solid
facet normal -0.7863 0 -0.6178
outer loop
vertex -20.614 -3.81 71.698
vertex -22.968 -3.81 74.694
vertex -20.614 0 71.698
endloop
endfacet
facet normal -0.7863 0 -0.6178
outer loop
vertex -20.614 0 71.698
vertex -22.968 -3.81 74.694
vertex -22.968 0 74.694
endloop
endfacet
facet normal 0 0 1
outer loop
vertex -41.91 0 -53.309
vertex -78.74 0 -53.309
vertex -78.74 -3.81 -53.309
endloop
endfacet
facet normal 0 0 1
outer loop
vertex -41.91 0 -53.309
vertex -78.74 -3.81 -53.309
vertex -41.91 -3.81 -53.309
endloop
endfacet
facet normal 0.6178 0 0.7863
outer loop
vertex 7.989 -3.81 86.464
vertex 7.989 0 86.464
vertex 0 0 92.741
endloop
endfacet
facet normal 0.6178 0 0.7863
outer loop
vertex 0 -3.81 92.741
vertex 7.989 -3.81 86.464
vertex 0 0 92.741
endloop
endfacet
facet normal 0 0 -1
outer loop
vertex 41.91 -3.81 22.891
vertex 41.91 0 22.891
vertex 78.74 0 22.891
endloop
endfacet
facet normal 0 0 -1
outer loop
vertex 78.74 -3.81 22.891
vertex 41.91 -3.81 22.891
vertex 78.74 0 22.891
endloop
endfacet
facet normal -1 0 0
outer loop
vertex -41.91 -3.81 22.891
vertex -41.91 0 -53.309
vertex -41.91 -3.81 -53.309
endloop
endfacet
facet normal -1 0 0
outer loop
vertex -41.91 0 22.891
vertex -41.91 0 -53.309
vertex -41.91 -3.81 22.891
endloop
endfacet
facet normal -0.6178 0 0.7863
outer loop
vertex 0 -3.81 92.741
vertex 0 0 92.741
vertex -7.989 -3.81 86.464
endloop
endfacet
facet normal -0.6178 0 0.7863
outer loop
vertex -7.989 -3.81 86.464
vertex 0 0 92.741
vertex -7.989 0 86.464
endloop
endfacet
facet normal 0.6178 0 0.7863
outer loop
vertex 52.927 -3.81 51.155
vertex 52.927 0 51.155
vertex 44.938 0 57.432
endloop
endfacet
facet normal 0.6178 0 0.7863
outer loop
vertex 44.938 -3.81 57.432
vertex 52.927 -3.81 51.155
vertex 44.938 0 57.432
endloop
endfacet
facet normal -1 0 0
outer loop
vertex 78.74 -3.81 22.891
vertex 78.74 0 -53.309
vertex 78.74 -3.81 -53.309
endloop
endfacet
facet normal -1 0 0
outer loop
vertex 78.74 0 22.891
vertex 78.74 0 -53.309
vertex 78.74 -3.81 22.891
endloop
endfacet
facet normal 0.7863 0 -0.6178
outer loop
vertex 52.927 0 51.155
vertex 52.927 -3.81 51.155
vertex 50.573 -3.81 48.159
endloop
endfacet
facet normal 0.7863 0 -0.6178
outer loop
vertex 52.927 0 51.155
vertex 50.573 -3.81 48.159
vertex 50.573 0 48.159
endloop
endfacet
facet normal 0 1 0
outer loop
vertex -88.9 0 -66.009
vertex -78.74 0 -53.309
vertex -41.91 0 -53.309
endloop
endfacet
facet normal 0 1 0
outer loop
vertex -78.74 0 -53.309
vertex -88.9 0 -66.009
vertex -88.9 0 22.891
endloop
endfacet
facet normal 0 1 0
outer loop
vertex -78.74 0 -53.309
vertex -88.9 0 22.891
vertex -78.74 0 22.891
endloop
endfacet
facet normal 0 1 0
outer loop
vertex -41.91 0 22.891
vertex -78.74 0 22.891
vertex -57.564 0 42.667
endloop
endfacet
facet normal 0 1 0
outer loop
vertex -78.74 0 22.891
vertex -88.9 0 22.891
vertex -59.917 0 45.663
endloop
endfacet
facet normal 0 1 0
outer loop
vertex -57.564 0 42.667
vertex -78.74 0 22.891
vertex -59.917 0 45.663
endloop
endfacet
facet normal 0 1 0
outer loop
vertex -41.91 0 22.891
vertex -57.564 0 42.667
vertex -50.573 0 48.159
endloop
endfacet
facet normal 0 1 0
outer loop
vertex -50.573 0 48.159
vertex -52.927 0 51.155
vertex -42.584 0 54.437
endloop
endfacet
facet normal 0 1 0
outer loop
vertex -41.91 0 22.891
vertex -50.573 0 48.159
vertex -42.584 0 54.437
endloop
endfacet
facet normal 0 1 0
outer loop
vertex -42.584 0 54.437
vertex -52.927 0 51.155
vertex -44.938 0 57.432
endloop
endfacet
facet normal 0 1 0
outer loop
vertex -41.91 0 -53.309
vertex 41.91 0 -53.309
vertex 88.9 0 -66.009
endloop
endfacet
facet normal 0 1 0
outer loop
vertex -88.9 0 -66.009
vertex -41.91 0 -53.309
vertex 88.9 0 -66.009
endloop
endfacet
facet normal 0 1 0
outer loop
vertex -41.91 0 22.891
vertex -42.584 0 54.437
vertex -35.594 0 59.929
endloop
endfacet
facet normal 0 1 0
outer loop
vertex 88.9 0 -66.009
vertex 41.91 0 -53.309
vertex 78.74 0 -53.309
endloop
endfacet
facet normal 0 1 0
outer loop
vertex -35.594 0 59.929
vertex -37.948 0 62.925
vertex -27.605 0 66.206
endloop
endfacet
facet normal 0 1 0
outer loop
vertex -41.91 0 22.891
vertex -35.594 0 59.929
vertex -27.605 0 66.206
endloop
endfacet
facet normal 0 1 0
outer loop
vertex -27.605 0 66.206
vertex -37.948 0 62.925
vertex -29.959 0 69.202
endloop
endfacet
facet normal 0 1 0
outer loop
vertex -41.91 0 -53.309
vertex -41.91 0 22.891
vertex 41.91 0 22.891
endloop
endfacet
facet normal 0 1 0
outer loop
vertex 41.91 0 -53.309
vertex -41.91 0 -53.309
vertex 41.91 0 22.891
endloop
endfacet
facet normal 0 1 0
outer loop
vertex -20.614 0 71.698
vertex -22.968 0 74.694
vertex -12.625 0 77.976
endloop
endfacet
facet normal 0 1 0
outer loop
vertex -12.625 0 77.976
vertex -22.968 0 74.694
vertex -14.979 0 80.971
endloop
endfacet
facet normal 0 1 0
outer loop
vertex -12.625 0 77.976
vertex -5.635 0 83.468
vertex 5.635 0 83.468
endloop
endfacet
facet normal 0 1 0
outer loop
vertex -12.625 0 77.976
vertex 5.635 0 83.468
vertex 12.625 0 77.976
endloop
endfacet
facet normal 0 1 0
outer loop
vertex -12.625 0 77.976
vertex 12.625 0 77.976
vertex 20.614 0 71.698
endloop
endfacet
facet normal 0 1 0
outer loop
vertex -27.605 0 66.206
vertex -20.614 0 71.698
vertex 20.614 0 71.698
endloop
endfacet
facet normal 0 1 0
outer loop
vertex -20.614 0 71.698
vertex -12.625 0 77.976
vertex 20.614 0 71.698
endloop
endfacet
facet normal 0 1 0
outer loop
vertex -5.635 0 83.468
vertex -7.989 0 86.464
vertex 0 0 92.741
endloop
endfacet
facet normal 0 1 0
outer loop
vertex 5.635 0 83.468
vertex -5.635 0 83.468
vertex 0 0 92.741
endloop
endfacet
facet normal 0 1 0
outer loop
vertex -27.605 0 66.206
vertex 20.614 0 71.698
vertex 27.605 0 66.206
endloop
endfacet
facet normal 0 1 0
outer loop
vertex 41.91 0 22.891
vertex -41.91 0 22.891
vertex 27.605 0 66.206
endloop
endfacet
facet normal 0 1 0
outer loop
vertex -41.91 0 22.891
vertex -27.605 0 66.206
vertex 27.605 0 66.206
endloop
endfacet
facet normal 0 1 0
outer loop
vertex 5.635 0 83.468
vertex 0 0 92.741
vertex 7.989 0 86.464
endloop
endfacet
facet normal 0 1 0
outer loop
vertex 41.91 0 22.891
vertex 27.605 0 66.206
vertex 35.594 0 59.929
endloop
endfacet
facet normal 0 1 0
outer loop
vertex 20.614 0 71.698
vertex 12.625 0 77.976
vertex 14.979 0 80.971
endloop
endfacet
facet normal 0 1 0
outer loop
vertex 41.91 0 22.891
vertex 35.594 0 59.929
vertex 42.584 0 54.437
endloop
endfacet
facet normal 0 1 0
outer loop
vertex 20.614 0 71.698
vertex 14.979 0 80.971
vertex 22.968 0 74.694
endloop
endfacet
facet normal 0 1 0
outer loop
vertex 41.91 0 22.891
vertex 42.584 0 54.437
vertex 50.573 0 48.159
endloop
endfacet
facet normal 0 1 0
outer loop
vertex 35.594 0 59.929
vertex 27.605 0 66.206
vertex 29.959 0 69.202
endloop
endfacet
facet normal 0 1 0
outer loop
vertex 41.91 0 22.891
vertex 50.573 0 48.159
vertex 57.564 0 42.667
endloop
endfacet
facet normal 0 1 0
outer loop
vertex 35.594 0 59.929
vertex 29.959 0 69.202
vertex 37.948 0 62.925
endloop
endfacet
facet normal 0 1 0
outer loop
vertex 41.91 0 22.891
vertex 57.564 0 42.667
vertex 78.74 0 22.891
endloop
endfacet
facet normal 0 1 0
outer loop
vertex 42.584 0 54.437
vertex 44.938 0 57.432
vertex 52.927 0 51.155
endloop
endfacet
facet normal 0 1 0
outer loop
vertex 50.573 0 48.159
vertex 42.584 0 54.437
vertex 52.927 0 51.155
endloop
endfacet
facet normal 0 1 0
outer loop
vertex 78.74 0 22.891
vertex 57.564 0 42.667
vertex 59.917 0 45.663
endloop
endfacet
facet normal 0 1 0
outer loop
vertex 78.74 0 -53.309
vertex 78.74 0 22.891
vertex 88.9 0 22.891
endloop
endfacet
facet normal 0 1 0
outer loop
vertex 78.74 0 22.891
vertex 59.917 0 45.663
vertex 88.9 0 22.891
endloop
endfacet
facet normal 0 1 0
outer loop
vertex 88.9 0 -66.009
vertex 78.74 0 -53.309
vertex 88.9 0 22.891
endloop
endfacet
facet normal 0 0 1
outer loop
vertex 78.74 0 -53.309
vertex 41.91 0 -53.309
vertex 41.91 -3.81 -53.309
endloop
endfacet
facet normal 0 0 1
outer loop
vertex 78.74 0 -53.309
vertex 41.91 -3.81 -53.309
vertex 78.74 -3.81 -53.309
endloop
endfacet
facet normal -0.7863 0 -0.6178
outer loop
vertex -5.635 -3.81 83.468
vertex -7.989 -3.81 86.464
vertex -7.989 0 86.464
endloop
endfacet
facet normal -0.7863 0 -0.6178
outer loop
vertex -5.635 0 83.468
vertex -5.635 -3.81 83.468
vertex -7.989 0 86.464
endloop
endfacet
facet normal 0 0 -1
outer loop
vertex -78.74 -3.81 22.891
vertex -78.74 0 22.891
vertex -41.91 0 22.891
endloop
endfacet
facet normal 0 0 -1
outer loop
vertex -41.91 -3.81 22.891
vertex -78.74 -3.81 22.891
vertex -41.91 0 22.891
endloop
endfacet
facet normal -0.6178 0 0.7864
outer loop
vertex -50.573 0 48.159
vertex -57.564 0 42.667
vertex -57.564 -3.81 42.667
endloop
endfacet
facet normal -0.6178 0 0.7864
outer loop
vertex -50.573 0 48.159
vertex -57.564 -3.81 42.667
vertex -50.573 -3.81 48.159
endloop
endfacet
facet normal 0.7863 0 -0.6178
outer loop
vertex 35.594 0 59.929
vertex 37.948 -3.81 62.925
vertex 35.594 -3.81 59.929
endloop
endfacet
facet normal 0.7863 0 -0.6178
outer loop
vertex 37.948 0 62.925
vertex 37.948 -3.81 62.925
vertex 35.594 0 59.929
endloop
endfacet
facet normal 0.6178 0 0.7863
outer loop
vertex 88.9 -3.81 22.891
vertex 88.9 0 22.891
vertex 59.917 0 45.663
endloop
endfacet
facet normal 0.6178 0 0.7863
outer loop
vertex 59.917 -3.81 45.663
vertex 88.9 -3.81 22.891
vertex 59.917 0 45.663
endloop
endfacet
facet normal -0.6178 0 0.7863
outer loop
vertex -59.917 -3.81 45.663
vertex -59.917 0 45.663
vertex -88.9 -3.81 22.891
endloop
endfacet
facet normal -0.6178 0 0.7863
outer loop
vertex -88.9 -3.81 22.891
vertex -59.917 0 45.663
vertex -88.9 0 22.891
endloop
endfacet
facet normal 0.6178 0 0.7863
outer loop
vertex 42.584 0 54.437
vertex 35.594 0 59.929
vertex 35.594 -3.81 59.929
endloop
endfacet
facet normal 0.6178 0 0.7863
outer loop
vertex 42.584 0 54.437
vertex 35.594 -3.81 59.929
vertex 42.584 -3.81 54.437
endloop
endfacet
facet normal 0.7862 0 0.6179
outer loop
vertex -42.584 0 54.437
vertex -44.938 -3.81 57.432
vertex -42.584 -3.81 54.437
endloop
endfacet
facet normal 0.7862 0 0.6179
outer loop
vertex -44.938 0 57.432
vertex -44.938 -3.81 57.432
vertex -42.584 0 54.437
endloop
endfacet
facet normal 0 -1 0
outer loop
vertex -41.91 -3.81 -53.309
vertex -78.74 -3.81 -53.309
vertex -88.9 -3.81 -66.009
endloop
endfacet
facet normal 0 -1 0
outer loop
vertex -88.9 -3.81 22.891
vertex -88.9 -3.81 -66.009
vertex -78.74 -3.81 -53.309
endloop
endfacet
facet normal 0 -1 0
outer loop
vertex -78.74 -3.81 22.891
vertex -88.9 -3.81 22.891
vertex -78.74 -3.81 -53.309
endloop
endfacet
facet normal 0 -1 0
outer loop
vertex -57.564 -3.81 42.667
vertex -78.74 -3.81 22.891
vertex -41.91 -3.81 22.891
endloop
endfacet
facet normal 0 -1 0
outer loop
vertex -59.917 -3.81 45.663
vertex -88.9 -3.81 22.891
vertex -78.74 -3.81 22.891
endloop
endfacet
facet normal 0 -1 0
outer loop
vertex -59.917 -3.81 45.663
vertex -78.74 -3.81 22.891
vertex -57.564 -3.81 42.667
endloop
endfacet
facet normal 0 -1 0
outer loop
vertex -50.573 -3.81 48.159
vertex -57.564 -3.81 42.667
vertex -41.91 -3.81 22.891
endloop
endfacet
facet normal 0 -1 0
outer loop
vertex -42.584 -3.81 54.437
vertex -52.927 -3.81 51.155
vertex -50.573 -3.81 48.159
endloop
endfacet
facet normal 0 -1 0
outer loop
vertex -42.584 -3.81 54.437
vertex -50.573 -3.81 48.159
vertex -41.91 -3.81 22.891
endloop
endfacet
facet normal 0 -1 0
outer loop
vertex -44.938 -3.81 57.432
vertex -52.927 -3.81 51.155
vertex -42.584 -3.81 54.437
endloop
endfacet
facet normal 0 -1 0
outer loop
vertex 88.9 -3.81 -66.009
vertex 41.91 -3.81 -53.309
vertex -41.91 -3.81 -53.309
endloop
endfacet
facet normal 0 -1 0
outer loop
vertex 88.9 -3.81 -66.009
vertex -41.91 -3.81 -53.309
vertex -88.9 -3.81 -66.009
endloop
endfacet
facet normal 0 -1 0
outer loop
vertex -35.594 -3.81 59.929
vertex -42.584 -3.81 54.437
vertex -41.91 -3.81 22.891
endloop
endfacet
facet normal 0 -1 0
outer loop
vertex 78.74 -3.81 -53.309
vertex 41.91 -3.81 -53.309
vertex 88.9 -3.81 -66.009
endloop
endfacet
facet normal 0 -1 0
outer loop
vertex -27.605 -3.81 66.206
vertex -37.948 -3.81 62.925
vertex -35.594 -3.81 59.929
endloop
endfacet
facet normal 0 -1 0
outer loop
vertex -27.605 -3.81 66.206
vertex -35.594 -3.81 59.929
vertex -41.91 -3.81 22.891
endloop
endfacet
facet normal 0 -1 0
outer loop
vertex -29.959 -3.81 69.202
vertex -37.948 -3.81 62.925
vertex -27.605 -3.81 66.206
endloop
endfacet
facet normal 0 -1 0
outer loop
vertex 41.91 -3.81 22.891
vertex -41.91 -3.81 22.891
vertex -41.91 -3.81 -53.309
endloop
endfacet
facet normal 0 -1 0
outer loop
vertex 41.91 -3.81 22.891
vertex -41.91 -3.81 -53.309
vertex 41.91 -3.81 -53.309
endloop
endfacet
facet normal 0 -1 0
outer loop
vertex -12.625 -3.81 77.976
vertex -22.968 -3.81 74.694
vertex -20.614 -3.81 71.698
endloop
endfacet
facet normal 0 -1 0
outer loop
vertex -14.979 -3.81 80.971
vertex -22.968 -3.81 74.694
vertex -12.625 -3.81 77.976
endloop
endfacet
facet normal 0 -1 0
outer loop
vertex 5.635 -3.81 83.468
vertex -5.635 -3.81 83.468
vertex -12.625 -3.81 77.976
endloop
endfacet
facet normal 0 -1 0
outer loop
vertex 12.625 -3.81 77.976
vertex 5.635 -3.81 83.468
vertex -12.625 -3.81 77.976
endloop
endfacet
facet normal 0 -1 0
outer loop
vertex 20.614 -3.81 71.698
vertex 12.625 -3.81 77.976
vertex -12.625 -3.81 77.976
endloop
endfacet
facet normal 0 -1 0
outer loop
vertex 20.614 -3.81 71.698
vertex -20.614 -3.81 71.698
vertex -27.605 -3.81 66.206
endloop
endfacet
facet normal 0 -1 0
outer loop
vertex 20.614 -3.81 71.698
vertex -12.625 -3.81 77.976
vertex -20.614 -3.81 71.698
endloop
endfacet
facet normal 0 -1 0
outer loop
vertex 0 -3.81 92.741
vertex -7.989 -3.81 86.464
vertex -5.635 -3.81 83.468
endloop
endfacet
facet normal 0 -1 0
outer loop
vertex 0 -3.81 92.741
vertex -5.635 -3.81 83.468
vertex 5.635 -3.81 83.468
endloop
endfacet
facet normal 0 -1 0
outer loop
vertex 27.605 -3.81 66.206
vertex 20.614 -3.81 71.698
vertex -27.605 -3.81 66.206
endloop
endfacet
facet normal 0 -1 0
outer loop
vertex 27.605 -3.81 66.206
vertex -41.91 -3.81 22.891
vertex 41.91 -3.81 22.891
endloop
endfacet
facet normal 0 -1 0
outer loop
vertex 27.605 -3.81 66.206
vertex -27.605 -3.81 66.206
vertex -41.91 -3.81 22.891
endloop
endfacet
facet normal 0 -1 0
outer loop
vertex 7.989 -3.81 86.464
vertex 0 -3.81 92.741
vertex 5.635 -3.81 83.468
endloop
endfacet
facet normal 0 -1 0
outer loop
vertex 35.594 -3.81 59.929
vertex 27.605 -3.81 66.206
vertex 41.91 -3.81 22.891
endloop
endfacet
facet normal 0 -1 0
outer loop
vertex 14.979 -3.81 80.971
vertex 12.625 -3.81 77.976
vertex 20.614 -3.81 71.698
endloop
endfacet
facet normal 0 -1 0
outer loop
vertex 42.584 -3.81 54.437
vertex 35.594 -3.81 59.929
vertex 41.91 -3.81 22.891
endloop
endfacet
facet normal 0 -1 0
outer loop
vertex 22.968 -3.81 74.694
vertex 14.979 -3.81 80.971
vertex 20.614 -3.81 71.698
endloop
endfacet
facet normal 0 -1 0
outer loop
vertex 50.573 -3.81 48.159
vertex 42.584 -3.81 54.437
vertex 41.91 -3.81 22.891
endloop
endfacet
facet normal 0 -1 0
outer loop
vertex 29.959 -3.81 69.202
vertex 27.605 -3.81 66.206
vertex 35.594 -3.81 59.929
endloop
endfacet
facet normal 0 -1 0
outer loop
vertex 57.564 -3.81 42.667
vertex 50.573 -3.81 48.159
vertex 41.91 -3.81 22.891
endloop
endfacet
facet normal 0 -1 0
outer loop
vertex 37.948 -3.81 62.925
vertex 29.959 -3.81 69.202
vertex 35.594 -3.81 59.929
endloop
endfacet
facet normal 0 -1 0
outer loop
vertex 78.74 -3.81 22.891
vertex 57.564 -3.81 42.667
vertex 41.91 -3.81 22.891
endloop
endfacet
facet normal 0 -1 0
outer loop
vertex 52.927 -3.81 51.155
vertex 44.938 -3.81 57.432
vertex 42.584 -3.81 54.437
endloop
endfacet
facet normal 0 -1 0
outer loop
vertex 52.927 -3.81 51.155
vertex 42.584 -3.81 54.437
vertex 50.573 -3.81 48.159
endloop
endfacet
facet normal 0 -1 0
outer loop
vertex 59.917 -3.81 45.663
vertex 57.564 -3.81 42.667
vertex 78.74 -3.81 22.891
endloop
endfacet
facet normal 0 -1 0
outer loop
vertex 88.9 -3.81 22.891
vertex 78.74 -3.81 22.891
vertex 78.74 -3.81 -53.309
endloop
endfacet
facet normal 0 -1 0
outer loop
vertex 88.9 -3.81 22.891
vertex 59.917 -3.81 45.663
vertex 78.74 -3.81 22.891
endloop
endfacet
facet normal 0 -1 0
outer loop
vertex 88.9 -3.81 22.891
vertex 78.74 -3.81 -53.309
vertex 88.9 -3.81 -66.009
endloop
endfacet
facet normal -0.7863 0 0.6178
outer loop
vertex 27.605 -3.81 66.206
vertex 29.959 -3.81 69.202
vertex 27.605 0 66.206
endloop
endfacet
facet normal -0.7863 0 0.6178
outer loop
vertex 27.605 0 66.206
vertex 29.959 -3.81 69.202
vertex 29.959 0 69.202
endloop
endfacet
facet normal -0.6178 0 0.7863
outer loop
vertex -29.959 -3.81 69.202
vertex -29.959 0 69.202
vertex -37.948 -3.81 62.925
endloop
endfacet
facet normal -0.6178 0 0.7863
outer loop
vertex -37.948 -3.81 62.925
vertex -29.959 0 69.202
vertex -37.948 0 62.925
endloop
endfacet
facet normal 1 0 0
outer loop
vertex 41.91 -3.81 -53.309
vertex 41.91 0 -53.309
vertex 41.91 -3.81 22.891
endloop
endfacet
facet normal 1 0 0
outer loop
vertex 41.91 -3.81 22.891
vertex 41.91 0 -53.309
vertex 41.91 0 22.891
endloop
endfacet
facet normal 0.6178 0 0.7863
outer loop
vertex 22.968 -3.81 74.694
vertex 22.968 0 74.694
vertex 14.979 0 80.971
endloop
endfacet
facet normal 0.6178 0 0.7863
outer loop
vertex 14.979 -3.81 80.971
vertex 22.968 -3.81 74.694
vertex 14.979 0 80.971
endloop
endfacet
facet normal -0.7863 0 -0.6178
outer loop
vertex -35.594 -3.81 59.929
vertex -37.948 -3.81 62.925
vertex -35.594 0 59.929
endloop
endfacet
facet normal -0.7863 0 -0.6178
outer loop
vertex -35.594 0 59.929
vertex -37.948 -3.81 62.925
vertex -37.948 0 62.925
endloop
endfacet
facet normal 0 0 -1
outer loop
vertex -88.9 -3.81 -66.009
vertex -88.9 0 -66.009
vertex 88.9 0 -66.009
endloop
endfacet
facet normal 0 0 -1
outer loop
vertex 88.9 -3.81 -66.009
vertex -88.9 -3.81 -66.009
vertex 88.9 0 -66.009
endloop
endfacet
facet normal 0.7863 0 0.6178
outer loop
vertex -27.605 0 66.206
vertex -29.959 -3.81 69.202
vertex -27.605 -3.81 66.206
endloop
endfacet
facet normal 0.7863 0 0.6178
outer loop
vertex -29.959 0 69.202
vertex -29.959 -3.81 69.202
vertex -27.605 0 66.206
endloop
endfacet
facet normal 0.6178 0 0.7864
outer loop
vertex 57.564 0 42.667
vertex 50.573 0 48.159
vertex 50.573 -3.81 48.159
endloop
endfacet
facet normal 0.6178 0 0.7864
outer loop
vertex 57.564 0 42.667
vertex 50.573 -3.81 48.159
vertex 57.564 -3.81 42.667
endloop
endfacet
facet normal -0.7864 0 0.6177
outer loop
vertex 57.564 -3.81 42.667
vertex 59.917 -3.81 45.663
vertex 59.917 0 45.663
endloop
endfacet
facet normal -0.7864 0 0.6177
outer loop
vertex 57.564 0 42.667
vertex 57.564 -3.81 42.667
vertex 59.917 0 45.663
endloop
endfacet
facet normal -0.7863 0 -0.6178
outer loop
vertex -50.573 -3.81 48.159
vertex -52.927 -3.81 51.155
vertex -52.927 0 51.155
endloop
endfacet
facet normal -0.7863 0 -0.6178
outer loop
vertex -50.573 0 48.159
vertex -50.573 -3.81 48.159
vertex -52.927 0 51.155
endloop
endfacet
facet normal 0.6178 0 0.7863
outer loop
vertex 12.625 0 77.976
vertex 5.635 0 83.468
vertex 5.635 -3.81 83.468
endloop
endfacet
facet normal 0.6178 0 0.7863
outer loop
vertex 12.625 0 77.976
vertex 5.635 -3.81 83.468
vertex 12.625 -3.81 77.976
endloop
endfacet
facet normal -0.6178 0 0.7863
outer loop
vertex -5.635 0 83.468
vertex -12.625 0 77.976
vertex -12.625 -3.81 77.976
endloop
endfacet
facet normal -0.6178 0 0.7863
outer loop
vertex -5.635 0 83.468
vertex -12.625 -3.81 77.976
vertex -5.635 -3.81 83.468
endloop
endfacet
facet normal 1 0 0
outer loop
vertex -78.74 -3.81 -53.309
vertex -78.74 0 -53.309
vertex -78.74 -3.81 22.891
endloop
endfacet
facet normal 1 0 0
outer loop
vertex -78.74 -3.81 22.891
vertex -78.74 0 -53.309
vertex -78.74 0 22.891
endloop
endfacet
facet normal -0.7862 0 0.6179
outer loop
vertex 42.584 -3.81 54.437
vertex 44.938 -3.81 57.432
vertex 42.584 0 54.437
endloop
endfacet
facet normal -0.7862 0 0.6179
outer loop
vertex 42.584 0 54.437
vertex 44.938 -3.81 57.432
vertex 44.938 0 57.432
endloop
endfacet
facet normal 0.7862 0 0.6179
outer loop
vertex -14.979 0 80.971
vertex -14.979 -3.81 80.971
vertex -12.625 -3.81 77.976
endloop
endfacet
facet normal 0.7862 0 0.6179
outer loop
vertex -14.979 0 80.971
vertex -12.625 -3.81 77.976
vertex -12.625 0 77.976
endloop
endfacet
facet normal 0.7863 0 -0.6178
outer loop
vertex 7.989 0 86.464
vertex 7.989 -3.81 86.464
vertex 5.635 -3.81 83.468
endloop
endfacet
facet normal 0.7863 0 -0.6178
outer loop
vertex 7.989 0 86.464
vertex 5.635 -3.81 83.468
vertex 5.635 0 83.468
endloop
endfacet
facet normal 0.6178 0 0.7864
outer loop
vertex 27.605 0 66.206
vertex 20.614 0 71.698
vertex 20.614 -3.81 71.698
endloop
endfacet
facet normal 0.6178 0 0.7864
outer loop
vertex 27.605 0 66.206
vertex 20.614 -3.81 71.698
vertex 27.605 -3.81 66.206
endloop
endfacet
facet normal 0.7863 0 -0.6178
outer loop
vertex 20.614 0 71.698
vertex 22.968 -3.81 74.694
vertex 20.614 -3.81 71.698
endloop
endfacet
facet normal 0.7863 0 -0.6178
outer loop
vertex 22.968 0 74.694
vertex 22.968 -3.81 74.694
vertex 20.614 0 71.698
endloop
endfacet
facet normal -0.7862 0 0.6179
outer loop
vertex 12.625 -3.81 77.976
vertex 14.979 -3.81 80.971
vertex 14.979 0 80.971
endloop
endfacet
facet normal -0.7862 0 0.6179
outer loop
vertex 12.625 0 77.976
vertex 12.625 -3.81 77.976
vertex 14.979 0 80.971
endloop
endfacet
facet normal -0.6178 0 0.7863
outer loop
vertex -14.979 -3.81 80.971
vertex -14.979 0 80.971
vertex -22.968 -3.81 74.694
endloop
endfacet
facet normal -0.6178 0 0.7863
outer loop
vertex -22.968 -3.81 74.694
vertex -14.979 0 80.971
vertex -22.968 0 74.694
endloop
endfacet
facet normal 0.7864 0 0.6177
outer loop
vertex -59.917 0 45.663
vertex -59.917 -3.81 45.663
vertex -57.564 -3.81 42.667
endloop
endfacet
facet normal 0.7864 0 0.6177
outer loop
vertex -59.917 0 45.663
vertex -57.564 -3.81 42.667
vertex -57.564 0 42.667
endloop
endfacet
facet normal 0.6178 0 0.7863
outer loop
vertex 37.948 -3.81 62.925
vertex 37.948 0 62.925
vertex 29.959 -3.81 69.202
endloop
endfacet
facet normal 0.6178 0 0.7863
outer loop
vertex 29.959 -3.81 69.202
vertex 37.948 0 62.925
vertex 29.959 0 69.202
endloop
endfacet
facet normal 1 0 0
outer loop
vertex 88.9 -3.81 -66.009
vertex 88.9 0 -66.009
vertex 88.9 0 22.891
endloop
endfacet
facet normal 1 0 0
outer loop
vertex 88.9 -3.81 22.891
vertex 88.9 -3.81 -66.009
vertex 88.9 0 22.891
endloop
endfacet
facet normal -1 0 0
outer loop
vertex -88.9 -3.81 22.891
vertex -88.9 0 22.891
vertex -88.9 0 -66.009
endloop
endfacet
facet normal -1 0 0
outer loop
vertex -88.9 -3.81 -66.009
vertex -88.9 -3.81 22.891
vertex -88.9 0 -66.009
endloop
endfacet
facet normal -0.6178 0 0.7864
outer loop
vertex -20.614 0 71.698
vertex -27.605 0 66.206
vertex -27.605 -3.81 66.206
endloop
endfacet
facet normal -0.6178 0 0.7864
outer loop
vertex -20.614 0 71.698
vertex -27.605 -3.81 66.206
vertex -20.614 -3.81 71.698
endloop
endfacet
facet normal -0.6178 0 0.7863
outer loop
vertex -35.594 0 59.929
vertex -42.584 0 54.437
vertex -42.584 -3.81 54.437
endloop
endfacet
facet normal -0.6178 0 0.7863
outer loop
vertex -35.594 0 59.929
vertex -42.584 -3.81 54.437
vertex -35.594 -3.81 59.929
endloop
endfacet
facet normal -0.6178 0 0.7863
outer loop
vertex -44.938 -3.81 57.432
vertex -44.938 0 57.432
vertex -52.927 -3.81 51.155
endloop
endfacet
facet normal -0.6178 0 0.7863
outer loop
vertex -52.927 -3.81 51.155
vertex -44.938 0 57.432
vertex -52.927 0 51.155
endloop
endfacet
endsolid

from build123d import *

# Parameters (mm, degrees)
F0_W     = 36.83
F0_H     = 76.2
F1_DEPTH = 3.81
F2_W     = 8.89
F2_H     = 3.81
F3_DEPTH = 3.81
F4_W     = 8.89
F4_H     = 3.81
F5_DEPTH = 3.81


with BuildPart() as f1:
    # F0 (on Front) → F1 (new body)
    with BuildSketch(Plane.XZ):
        Polygon((-88.9, -66.0091239631), (0, -66.0091239631), (88.9, -66.0091239631), (88.9, 22.8908760369), (0, 92.7408760369), (-88.9, 22.8908760369), align=None)
        with Locations((-60.325, -15.2091239631)):
            Rectangle(F0_W, F0_H, mode=Mode.SUBTRACT)
        with Locations((60.325, -15.2091239631)):
            Rectangle(F0_W, F0_H, mode=Mode.SUBTRACT)
    extrude(amount=F1_DEPTH)

    # F2 (on face) → F3 (cut)
    with BuildSketch(Plane(origin=(-45.0539271599, 0, 57.3413618398), x_dir=(0.7863183388, 0, 0.6178215519), z_dir=(-0.6178215519, 0, 0.7863183388))):
        with Locations((-14.4576880394, -1.905)):
            Rectangle(F2_W, F2_H)
        with Locations((23.6423119606, -1.905)):
            Rectangle(F2_W, F2_H)
        with Locations((42.6923119606, -1.905)):
            Rectangle(F2_W, F2_H)
        with Locations((4.5923119606, -1.905)):
            Rectangle(F2_W, F2_H)
    extrude(amount=-F3_DEPTH, mode=Mode.SUBTRACT)

    # F4 (on face) → F5 (cut)
    with BuildSketch(Plane(origin=(45.0539271599, 0, 57.3413618398), x_dir=(0.7863183388, 0, -0.6178215519), z_dir=(0.6178215519, 0, 0.7863183388))):
        with Locations((-42.6923119606, -1.905)):
            Rectangle(F4_W, F4_H)
        with Locations((-23.6423119606, -1.905)):
            Rectangle(F4_W, F4_H)
        with Locations((-4.5923119606, -1.905)):
            Rectangle(F4_W, F4_H)
        with Locations((14.4576880394, -1.905)):
            Rectangle(F4_W, F4_H)
    extrude(amount=-F5_DEPTH, mode=Mode.SUBTRACT)


solid = f1.part
